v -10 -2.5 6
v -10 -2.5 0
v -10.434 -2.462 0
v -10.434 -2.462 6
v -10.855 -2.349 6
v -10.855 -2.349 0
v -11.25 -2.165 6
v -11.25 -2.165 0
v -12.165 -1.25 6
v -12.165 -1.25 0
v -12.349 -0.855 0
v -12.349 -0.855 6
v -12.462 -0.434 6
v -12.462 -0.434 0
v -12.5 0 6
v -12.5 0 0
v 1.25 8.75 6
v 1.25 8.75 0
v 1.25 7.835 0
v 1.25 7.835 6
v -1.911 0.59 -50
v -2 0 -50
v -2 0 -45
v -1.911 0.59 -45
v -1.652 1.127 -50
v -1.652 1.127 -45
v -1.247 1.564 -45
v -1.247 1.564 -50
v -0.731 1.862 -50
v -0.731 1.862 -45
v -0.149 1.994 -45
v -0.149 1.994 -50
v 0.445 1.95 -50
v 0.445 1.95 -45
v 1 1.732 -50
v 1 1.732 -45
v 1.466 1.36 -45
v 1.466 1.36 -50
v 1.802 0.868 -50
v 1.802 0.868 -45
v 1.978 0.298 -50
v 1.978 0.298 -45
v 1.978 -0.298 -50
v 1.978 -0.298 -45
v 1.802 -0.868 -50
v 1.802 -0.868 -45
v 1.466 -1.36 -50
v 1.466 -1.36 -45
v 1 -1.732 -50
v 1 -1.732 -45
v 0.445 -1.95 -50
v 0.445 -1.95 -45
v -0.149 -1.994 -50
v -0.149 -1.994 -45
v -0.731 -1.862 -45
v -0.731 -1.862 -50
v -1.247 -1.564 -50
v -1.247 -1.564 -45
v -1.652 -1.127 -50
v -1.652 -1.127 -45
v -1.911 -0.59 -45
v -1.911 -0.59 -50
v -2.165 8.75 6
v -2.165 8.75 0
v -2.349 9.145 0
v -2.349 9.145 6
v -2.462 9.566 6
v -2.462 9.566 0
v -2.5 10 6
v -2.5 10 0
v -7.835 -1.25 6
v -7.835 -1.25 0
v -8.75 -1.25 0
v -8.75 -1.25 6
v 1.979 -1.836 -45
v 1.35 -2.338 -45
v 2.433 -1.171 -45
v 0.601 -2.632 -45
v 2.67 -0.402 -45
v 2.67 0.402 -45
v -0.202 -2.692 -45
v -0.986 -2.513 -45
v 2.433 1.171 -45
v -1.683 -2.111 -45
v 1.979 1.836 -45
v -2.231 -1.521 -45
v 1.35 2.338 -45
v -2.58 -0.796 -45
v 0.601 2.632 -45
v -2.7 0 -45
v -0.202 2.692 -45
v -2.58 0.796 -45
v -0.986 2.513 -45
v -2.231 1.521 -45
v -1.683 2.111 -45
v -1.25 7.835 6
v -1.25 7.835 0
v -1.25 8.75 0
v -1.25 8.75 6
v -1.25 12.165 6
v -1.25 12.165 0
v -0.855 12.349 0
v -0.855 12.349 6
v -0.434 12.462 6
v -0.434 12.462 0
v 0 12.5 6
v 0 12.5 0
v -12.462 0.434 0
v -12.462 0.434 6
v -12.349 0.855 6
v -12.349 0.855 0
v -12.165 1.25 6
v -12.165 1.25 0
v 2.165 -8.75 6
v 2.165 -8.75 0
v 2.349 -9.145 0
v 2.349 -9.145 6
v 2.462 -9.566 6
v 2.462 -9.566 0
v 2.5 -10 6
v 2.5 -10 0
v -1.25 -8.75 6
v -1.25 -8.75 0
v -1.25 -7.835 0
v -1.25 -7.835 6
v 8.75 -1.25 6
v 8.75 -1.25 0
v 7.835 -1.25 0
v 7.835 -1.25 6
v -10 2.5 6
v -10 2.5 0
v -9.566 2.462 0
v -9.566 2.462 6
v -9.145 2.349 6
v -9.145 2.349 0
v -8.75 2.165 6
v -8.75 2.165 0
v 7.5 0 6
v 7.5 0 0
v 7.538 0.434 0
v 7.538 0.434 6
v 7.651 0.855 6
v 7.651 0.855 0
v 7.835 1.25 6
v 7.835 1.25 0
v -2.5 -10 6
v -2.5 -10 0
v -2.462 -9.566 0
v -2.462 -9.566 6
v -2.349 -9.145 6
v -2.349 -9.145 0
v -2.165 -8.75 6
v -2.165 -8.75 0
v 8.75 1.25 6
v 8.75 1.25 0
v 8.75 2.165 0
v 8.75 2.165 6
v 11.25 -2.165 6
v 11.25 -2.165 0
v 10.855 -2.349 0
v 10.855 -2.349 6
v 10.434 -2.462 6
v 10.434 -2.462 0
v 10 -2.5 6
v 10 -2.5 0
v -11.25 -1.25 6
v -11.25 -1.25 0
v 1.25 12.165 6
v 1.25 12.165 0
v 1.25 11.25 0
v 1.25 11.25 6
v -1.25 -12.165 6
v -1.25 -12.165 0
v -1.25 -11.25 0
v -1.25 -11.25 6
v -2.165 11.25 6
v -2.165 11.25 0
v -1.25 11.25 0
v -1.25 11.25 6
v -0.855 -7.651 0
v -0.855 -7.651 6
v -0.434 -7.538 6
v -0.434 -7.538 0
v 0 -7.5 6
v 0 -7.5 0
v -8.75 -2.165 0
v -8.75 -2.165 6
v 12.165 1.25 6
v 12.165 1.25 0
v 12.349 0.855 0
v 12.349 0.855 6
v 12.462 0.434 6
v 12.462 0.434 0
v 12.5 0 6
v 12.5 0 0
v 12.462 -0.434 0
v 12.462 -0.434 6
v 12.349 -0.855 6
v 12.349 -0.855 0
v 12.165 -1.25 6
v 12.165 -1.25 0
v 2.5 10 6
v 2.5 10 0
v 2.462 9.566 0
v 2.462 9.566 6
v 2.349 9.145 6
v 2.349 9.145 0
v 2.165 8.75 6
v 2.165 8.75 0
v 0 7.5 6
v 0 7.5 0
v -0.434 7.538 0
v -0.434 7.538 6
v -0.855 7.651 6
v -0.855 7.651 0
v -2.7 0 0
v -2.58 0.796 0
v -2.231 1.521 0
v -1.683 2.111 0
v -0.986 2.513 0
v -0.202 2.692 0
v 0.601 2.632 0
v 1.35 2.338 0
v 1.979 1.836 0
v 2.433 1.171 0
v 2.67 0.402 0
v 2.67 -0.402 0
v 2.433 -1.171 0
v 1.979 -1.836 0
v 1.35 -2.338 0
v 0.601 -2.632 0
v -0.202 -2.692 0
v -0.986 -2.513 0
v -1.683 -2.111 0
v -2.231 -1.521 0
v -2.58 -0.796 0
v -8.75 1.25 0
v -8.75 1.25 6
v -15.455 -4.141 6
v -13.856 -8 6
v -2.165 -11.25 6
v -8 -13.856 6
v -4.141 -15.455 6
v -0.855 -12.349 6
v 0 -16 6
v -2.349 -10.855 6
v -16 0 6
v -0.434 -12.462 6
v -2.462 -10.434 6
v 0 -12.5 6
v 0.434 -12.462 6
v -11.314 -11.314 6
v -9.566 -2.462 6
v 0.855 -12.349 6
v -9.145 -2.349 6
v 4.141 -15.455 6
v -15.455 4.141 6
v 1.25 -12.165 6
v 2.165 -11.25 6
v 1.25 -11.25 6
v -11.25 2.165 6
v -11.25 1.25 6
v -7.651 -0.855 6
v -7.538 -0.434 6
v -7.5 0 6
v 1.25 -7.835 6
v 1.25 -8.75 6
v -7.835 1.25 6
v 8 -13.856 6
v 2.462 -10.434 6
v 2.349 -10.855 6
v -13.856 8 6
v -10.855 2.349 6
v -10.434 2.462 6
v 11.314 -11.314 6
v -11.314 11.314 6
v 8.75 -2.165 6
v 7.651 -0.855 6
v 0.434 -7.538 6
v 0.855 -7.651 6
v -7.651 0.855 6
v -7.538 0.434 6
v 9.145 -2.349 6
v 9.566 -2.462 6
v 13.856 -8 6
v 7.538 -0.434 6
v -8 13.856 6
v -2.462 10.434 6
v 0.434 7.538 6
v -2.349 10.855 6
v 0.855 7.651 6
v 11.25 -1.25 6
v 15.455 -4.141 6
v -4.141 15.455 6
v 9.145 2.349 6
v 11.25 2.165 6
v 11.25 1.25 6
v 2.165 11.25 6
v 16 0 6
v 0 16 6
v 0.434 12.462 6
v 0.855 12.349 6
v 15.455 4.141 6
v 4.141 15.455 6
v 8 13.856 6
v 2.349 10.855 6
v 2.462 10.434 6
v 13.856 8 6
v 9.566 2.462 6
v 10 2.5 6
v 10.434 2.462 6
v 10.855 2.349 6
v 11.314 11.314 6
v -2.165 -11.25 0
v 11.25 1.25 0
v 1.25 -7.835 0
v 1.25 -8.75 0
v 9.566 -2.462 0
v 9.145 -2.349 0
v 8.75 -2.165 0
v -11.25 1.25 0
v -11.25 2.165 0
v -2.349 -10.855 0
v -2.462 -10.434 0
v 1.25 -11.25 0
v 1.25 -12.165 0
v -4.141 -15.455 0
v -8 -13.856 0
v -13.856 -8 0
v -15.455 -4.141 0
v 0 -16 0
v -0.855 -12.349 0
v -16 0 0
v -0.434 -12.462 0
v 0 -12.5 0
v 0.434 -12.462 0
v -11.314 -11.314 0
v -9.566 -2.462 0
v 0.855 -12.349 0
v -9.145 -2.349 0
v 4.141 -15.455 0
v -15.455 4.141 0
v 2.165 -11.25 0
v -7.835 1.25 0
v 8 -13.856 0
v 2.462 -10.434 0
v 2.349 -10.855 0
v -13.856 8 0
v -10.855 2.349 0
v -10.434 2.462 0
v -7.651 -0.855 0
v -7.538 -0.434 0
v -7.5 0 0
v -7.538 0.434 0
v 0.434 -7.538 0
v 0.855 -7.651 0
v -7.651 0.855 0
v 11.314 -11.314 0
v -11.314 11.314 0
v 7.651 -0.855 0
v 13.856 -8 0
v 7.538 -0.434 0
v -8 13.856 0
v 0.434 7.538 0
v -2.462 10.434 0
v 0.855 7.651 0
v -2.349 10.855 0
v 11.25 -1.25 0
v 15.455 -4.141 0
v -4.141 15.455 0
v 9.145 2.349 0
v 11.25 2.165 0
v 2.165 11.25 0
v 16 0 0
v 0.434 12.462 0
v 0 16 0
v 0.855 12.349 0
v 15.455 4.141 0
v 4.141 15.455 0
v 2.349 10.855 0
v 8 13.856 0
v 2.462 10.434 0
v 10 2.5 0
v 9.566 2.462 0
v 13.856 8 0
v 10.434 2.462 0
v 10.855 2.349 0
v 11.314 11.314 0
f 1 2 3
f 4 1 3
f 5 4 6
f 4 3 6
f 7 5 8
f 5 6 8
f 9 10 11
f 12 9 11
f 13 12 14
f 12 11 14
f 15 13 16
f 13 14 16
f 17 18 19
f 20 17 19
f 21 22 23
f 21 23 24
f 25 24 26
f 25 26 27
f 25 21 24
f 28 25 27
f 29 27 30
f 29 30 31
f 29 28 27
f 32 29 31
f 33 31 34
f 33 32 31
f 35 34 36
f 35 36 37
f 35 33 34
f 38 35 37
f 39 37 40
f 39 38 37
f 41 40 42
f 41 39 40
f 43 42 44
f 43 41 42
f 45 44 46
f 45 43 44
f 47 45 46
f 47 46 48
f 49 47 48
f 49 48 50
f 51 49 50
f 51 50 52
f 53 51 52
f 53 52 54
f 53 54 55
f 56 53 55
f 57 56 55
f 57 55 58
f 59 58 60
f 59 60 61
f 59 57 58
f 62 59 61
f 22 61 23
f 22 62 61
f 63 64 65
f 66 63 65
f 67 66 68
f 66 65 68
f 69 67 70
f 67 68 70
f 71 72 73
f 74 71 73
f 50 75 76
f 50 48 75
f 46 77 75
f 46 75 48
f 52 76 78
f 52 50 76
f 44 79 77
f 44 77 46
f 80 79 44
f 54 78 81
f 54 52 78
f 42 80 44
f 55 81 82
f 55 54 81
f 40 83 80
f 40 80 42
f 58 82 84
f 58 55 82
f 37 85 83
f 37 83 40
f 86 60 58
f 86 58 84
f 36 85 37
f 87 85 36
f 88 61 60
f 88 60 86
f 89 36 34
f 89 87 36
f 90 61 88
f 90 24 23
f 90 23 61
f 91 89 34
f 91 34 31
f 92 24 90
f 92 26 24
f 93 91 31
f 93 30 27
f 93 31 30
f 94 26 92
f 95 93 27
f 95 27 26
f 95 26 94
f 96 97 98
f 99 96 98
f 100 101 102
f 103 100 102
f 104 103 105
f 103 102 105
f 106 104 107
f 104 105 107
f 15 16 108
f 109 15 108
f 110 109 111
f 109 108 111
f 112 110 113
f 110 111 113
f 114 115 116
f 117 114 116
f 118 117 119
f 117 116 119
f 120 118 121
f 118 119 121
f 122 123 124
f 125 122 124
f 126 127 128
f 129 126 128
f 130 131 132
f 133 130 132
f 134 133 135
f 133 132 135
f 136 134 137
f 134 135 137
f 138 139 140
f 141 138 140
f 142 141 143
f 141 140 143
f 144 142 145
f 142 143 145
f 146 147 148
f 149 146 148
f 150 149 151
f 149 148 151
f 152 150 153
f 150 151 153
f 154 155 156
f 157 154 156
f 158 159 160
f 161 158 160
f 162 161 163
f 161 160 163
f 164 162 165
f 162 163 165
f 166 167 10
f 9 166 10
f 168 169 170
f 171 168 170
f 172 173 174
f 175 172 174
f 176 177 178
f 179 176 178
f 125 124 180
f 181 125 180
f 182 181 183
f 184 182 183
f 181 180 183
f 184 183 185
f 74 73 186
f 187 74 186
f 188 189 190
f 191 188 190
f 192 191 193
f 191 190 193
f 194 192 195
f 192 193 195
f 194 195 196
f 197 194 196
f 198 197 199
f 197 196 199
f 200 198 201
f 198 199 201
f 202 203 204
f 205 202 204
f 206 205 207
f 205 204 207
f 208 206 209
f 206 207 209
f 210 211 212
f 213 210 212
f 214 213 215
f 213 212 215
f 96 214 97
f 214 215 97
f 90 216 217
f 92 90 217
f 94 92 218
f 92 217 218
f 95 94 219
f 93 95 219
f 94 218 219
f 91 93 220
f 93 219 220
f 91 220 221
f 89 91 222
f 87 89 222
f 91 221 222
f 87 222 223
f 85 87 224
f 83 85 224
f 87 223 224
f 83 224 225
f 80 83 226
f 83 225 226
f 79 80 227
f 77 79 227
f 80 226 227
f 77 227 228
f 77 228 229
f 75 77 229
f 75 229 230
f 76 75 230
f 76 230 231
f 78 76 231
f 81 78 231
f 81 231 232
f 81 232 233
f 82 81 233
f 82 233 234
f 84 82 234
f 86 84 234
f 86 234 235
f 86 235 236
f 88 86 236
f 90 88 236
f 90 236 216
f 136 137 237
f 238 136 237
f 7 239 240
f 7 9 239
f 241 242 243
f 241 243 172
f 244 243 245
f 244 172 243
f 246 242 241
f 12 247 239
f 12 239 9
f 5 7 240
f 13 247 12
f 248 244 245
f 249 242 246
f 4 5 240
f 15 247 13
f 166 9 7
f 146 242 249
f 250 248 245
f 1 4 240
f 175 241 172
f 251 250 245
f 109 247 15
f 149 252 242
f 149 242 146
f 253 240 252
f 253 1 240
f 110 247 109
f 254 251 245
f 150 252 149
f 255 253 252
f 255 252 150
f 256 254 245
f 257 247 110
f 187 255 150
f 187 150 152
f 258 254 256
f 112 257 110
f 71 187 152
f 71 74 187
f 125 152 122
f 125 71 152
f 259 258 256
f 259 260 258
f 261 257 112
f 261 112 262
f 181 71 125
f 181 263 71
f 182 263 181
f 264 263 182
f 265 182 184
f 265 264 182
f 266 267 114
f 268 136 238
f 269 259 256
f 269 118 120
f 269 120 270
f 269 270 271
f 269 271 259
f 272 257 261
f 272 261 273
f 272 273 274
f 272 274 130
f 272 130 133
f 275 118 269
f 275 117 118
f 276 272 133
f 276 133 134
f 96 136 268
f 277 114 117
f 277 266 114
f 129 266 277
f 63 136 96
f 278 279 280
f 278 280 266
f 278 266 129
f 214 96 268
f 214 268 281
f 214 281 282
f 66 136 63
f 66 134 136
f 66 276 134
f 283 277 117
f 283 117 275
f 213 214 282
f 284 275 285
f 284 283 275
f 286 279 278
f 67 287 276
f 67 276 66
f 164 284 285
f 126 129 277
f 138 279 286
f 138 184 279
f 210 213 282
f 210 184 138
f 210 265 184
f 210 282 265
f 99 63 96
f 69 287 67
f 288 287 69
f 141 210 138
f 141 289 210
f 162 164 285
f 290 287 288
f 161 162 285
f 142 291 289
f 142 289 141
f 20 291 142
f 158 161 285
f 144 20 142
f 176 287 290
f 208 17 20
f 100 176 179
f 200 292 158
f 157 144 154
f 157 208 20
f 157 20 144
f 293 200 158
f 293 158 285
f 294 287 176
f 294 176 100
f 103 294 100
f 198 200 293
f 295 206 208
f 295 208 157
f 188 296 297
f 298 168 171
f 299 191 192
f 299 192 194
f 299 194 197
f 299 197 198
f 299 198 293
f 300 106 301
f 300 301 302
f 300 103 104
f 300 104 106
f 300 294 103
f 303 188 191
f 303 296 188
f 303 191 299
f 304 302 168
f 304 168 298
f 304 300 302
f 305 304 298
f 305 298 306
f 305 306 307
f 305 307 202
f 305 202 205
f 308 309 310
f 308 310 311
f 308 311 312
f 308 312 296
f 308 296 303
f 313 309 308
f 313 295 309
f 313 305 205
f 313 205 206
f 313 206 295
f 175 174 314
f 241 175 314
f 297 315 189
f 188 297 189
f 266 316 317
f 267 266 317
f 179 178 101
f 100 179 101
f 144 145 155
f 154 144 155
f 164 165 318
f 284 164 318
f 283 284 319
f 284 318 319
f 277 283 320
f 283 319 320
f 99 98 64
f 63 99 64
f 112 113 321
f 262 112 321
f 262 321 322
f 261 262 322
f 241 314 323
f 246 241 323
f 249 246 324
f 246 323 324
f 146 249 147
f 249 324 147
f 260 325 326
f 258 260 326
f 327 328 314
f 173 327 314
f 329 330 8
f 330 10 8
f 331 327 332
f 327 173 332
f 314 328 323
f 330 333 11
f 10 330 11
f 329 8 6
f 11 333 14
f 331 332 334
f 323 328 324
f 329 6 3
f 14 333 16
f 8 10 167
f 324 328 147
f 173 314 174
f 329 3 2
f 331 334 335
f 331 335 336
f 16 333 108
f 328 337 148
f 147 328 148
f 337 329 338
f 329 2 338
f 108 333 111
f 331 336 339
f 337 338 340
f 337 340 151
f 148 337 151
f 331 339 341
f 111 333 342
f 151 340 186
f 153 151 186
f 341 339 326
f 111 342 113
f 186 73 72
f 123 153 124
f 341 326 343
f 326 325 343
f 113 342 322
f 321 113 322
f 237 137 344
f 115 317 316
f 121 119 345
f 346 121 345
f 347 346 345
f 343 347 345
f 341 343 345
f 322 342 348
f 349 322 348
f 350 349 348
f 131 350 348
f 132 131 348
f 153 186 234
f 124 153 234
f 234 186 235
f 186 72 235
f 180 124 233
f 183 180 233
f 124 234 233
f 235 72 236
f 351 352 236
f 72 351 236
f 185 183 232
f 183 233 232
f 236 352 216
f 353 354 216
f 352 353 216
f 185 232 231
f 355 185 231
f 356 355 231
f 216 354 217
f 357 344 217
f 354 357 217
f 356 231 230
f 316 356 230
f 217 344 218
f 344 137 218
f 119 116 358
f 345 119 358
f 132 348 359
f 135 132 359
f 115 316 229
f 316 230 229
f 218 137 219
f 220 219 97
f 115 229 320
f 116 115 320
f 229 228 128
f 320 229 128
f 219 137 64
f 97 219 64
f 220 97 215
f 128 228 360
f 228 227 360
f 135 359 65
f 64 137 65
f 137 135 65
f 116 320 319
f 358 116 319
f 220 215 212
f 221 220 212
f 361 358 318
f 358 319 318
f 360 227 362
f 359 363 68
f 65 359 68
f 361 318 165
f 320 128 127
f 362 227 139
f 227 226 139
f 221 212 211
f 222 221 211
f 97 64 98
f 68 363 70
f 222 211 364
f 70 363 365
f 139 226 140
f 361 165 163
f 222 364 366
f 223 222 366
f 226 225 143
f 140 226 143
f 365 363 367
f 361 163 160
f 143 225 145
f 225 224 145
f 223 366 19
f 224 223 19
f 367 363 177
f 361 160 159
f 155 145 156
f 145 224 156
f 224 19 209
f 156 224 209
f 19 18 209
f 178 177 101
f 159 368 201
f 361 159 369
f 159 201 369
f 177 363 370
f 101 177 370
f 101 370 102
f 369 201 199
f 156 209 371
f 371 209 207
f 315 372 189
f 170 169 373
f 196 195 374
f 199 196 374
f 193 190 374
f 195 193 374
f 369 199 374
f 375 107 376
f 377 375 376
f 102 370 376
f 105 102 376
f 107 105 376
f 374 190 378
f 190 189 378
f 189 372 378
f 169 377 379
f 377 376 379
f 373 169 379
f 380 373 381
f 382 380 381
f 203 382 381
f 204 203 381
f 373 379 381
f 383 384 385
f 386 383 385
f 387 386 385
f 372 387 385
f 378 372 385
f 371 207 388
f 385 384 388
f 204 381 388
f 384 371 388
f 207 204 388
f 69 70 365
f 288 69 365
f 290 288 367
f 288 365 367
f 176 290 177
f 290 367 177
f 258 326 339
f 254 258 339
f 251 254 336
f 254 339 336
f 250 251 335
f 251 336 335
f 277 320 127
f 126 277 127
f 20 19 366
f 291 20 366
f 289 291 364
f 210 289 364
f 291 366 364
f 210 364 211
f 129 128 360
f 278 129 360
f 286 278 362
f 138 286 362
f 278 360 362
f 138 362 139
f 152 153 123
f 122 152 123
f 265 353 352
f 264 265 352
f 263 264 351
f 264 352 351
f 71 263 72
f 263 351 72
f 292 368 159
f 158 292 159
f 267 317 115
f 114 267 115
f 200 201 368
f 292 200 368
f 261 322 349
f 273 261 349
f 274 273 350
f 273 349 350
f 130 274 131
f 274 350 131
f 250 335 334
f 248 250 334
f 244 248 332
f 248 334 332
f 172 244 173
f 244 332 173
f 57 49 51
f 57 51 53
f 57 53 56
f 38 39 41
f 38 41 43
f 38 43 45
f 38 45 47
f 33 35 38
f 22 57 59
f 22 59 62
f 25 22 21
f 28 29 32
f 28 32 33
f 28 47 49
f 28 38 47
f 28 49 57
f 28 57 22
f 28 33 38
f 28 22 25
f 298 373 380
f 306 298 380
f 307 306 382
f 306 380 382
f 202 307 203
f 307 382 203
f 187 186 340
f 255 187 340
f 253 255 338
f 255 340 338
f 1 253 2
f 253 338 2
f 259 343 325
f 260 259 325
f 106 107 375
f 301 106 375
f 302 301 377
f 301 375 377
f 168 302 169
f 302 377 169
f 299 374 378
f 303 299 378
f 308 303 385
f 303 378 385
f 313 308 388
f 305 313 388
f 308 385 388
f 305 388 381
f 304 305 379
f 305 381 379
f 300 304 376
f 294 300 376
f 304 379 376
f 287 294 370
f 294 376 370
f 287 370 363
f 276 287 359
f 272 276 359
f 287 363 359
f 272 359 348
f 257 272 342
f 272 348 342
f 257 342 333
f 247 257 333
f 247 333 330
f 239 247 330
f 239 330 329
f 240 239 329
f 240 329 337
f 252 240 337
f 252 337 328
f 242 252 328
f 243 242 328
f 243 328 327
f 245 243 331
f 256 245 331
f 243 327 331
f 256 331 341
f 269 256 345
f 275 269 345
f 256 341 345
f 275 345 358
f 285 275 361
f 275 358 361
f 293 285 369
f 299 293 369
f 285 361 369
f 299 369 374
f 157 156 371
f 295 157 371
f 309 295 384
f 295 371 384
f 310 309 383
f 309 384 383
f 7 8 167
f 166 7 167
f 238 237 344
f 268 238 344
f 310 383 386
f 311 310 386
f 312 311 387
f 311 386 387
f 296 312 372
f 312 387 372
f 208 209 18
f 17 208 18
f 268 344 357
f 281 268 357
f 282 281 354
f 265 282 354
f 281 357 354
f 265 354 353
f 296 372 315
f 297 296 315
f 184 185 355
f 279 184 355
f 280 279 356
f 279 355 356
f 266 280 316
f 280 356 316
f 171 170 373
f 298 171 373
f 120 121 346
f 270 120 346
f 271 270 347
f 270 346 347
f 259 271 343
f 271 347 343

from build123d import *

# Parameters (mm, degrees)
CROQUIS2_R              = 16
SALIENTE_EXTRUIR1_DEPTH = 6
CROQUIS3_R              = 2.7
SALIENTE_EXTRUIR2_DEPTH = 50
CROQUIS4_R              = 2.7
CROQUIS4_R_2            = 2
CORTAR_EXTRUIR1_DEPTH   = 5


with BuildPart() as part:
    # Croquis2 → Saliente-Extruir1 (new body)
    with BuildSketch(Plane.XY):
        Circle(CROQUIS2_R)
        with BuildLine():
            Line((1.25, 12.165063509), (1.25, 11.25))
            Line((1.25, 11.25), (2.165063509, 11.25))
            ThreePointArc((2.165063509, 11.25), (2.414814566, 10.647047613), (2.5, 10))
            ThreePointArc((2.5, 10), (2.414814566, 9.352952387), (2.165063509, 8.75))
            Line((2.165063509, 8.75), (1.25, 8.75))
            Line((1.25, 8.75), (1.25, 7.834936491))
            ThreePointArc((1.25, 7.834936491), (0.647047613, 7.585185434), (0, 7.5))
            ThreePointArc((0, 7.5), (-0.647047613, 7.585185434), (-1.25, 7.834936491))
            Line((-1.25, 7.834936491), (-1.25, 8.75))
            Line((-1.25, 8.75), (-2.165063509, 8.75))
            ThreePointArc((-2.165063509, 8.75), (-2.414814566, 9.352952387), (-2.5, 10))
            ThreePointArc((-2.5, 10), (-2.414814566, 10.647047613), (-2.165063509, 11.25))
            Line((-2.165063509, 11.25), (-1.25, 11.25))
            Line((-1.25, 11.25), (-1.25, 12.165063509))
            ThreePointArc((-1.25, 12.165063509), (-0.647047613, 12.414814566), (0, 12.5))
            ThreePointArc((0, 12.5), (0.647047613, 12.414814566), (1.25, 12.165063509))
        make_face(mode=Mode.SUBTRACT)
        with BuildLine():
            Line((12.165063509, -1.25), (11.25, -1.25))
            Line((11.25, -1.25), (11.25, -2.165063509))
            ThreePointArc((11.25, -2.165063509), (10.647047613, -2.414814566), (10, -2.5))
            ThreePointArc((10, -2.5), (9.352952387, -2.414814566), (8.75, -2.165063509))
            Line((8.75, -2.165063509), (8.75, -1.25))
            Line((8.75, -1.25), (7.834936491, -1.25))
            ThreePointArc((7.834936491, -1.25), (7.585185434, -0.647047613), (7.5, 0))
            ThreePointArc((7.5, 0), (7.585185434, 0.647047613), (7.834936491, 1.25))
            Line((7.834936491, 1.25), (8.75, 1.25))
            Line((8.75, 1.25), (8.75, 2.165063509))
            ThreePointArc((8.75, 2.165063509), (9.352952387, 2.414814566), (10, 2.5))
            ThreePointArc((10, 2.5), (10.647047613, 2.414814566), (11.25, 2.165063509))
            Line((11.25, 2.165063509), (11.25, 1.25))
            Line((11.25, 1.25), (12.165063509, 1.25))
            ThreePointArc((12.165063509, 1.25), (12.414814566, 0.647047613), (12.5, 0))
            ThreePointArc((12.5, 0), (12.414814566, -0.647047613), (12.165063509, -1.25))
        make_face(mode=Mode.SUBTRACT)
        with BuildLine():
            Line((-1.25, -12.165063509), (-1.25, -11.25))
            Line((-1.25, -11.25), (-2.165063509, -11.25))
            ThreePointArc((-2.165063509, -11.25), (-2.414814566, -10.647047613), (-2.5, -10))
            ThreePointArc((-2.5, -10), (-2.414814566, -9.352952387), (-2.165063509, -8.75))
            Line((-2.165063509, -8.75), (-1.25, -8.75))
            Line((-1.25, -8.75), (-1.25, -7.834936491))
            ThreePointArc((-1.25, -7.834936491), (-0.647047613, -7.585185434), (0, -7.5))
            ThreePointArc((0, -7.5), (0.647047613, -7.585185434), (1.25, -7.834936491))
            Line((1.25, -7.834936491), (1.25, -8.75))
            Line((1.25, -8.75), (2.165063509, -8.75))
            ThreePointArc((2.165063509, -8.75), (2.414814566, -9.352952387), (2.5, -10))
            ThreePointArc((2.5, -10), (2.414814566, -10.647047613), (2.165063509, -11.25))
            Line((2.165063509, -11.25), (1.25, -11.25))
            Line((1.25, -11.25), (1.25, -12.165063509))
            ThreePointArc((1.25, -12.165063509), (0.647047613, -12.414814566), (0, -12.5))
            ThreePointArc((0, -12.5), (-0.647047613, -12.414814566), (-1.25, -12.165063509))
        make_face(mode=Mode.SUBTRACT)
        with BuildLine():
            Line((-12.165063509, 1.25), (-11.25, 1.25))
            Line((-11.25, 1.25), (-11.25, 2.165063509))
            ThreePointArc((-11.25, 2.165063509), (-10.647047613, 2.414814566), (-10, 2.5))
            ThreePointArc((-10, 2.5), (-9.352952387, 2.414814566), (-8.75, 2.165063509))
            Line((-8.75, 2.165063509), (-8.75, 1.25))
            Line((-8.75, 1.25), (-7.834936491, 1.25))
            ThreePointArc((-7.834936491, 1.25), (-7.585185434, 0.647047613), (-7.5, 0))
            ThreePointArc((-7.5, 0), (-7.585185434, -0.647047613), (-7.834936491, -1.25))
            Line((-7.834936491, -1.25), (-8.75, -1.25))
            Line((-8.75, -1.25), (-8.75, -2.165063509))
            ThreePointArc((-8.75, -2.165063509), (-9.352952387, -2.414814566), (-10, -2.5))
            ThreePointArc((-10, -2.5), (-10.647047613, -2.414814566), (-11.25, -2.165063509))
            Line((-11.25, -2.165063509), (-11.25, -1.25))
            Line((-11.25, -1.25), (-12.165063509, -1.25))
            ThreePointArc((-12.165063509, -1.25), (-12.414814566, -0.647047613), (-12.5, 0))
            ThreePointArc((-12.5, 0), (-12.414814566, 0.647047613), (-12.165063509, 1.25))
        make_face(mode=Mode.SUBTRACT)
    extrude(amount=SALIENTE_EXTRUIR1_DEPTH)

    # Croquis3 → Saliente-Extruir2 (add)
    with BuildSketch(Plane(origin=(0, 0, 0), x_dir=(-1, 0, 0), z_dir=(0, 0, -1))):
        Circle(CROQUIS3_R)
    extrude(amount=SALIENTE_EXTRUIR2_DEPTH)

    # Croquis4 → Cortar-Extruir1 (cut)
    with BuildSketch(Plane(origin=(0, 0, -50), x_dir=(-1, 0, 0), z_dir=(0, 0, -1))):
        Circle(CROQUIS4_R)
        Circle(CROQUIS4_R_2, mode=Mode.SUBTRACT)
    extrude(amount=-CORTAR_EXTRUIR1_DEPTH, mode=Mode.SUBTRACT)


solid = part.part
